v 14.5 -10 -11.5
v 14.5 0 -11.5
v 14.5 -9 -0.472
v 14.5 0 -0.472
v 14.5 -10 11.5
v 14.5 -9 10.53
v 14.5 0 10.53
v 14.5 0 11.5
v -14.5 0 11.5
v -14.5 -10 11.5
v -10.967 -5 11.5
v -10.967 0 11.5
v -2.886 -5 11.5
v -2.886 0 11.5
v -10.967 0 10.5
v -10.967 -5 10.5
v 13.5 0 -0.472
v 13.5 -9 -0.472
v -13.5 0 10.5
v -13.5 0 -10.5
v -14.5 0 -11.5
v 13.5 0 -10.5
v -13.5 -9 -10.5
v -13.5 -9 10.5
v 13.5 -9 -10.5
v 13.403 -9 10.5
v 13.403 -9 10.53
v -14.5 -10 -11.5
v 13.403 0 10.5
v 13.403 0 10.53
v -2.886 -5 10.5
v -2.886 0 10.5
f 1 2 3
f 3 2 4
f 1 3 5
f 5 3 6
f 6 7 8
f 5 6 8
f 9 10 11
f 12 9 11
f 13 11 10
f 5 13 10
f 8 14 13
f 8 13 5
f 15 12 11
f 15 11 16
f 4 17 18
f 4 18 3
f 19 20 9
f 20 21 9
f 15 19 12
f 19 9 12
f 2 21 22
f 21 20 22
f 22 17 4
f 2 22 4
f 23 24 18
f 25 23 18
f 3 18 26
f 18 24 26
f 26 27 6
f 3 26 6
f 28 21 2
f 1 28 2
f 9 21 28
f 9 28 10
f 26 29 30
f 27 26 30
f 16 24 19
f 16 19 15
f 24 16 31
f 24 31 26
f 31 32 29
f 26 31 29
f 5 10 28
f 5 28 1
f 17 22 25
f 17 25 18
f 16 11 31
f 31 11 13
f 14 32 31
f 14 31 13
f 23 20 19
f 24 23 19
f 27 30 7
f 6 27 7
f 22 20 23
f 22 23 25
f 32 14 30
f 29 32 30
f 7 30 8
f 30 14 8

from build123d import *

# Parameters (mm, degrees)
F0_W     = 29
F0_H     = 23
F0_W_2   = 27
F0_H_2   = 21
F1_DEPTH = 10
F2_DEPTH = 9
F3_W     = 1.23707
F3_H     = 11.001679
F4_DEPTH = 9
F5_W     = 8.081423
F5_H     = 0.370867
F6_DEPTH = 5


with BuildPart() as f1:
    # F0 (on Front) → F1 (new body)
    with BuildSketch(Plane.XZ):
        Rectangle(F0_W, F0_H)
        Rectangle(F0_W_2, F0_H_2, mode=Mode.SUBTRACT)
        Rectangle(F0_W_2, F0_H_2)
    extrude(amount=F1_DEPTH)

    # F0 (on Front) → F2 (cut)
    with BuildSketch(Plane.XZ):
        Rectangle(F0_W_2, F0_H_2)
    extrude(amount=F2_DEPTH, mode=Mode.SUBTRACT)

    # F3 (on face) → F4 (cut)
    with BuildSketch(Plane.XZ):
        with Locations((14.021569, 5.029028)):
            Rectangle(F3_W, F3_H)
    extrude(amount=F4_DEPTH, mode=Mode.SUBTRACT)

    # F5 (on face) → F6 (cut)
    with BuildSketch(Plane.XZ):
        Polygon((-10.967096, 11.561035), (-10.967096, 11.5), (-2.885673, 11.5), (-2.885673, 11.855262), (-10.967096, 11.855262), align=None)
        with Locations((-6.926384, 10.314566)):
            Rectangle(F5_W, F5_H)
        Polygon((-10.967096, 11.5), (-10.967096, 10.521435), (-10.967096, 10.5), (-2.885673, 10.5), (-2.885673, 11.5), align=None)
    extrude(amount=F6_DEPTH, mode=Mode.SUBTRACT)


solid = f1.part
